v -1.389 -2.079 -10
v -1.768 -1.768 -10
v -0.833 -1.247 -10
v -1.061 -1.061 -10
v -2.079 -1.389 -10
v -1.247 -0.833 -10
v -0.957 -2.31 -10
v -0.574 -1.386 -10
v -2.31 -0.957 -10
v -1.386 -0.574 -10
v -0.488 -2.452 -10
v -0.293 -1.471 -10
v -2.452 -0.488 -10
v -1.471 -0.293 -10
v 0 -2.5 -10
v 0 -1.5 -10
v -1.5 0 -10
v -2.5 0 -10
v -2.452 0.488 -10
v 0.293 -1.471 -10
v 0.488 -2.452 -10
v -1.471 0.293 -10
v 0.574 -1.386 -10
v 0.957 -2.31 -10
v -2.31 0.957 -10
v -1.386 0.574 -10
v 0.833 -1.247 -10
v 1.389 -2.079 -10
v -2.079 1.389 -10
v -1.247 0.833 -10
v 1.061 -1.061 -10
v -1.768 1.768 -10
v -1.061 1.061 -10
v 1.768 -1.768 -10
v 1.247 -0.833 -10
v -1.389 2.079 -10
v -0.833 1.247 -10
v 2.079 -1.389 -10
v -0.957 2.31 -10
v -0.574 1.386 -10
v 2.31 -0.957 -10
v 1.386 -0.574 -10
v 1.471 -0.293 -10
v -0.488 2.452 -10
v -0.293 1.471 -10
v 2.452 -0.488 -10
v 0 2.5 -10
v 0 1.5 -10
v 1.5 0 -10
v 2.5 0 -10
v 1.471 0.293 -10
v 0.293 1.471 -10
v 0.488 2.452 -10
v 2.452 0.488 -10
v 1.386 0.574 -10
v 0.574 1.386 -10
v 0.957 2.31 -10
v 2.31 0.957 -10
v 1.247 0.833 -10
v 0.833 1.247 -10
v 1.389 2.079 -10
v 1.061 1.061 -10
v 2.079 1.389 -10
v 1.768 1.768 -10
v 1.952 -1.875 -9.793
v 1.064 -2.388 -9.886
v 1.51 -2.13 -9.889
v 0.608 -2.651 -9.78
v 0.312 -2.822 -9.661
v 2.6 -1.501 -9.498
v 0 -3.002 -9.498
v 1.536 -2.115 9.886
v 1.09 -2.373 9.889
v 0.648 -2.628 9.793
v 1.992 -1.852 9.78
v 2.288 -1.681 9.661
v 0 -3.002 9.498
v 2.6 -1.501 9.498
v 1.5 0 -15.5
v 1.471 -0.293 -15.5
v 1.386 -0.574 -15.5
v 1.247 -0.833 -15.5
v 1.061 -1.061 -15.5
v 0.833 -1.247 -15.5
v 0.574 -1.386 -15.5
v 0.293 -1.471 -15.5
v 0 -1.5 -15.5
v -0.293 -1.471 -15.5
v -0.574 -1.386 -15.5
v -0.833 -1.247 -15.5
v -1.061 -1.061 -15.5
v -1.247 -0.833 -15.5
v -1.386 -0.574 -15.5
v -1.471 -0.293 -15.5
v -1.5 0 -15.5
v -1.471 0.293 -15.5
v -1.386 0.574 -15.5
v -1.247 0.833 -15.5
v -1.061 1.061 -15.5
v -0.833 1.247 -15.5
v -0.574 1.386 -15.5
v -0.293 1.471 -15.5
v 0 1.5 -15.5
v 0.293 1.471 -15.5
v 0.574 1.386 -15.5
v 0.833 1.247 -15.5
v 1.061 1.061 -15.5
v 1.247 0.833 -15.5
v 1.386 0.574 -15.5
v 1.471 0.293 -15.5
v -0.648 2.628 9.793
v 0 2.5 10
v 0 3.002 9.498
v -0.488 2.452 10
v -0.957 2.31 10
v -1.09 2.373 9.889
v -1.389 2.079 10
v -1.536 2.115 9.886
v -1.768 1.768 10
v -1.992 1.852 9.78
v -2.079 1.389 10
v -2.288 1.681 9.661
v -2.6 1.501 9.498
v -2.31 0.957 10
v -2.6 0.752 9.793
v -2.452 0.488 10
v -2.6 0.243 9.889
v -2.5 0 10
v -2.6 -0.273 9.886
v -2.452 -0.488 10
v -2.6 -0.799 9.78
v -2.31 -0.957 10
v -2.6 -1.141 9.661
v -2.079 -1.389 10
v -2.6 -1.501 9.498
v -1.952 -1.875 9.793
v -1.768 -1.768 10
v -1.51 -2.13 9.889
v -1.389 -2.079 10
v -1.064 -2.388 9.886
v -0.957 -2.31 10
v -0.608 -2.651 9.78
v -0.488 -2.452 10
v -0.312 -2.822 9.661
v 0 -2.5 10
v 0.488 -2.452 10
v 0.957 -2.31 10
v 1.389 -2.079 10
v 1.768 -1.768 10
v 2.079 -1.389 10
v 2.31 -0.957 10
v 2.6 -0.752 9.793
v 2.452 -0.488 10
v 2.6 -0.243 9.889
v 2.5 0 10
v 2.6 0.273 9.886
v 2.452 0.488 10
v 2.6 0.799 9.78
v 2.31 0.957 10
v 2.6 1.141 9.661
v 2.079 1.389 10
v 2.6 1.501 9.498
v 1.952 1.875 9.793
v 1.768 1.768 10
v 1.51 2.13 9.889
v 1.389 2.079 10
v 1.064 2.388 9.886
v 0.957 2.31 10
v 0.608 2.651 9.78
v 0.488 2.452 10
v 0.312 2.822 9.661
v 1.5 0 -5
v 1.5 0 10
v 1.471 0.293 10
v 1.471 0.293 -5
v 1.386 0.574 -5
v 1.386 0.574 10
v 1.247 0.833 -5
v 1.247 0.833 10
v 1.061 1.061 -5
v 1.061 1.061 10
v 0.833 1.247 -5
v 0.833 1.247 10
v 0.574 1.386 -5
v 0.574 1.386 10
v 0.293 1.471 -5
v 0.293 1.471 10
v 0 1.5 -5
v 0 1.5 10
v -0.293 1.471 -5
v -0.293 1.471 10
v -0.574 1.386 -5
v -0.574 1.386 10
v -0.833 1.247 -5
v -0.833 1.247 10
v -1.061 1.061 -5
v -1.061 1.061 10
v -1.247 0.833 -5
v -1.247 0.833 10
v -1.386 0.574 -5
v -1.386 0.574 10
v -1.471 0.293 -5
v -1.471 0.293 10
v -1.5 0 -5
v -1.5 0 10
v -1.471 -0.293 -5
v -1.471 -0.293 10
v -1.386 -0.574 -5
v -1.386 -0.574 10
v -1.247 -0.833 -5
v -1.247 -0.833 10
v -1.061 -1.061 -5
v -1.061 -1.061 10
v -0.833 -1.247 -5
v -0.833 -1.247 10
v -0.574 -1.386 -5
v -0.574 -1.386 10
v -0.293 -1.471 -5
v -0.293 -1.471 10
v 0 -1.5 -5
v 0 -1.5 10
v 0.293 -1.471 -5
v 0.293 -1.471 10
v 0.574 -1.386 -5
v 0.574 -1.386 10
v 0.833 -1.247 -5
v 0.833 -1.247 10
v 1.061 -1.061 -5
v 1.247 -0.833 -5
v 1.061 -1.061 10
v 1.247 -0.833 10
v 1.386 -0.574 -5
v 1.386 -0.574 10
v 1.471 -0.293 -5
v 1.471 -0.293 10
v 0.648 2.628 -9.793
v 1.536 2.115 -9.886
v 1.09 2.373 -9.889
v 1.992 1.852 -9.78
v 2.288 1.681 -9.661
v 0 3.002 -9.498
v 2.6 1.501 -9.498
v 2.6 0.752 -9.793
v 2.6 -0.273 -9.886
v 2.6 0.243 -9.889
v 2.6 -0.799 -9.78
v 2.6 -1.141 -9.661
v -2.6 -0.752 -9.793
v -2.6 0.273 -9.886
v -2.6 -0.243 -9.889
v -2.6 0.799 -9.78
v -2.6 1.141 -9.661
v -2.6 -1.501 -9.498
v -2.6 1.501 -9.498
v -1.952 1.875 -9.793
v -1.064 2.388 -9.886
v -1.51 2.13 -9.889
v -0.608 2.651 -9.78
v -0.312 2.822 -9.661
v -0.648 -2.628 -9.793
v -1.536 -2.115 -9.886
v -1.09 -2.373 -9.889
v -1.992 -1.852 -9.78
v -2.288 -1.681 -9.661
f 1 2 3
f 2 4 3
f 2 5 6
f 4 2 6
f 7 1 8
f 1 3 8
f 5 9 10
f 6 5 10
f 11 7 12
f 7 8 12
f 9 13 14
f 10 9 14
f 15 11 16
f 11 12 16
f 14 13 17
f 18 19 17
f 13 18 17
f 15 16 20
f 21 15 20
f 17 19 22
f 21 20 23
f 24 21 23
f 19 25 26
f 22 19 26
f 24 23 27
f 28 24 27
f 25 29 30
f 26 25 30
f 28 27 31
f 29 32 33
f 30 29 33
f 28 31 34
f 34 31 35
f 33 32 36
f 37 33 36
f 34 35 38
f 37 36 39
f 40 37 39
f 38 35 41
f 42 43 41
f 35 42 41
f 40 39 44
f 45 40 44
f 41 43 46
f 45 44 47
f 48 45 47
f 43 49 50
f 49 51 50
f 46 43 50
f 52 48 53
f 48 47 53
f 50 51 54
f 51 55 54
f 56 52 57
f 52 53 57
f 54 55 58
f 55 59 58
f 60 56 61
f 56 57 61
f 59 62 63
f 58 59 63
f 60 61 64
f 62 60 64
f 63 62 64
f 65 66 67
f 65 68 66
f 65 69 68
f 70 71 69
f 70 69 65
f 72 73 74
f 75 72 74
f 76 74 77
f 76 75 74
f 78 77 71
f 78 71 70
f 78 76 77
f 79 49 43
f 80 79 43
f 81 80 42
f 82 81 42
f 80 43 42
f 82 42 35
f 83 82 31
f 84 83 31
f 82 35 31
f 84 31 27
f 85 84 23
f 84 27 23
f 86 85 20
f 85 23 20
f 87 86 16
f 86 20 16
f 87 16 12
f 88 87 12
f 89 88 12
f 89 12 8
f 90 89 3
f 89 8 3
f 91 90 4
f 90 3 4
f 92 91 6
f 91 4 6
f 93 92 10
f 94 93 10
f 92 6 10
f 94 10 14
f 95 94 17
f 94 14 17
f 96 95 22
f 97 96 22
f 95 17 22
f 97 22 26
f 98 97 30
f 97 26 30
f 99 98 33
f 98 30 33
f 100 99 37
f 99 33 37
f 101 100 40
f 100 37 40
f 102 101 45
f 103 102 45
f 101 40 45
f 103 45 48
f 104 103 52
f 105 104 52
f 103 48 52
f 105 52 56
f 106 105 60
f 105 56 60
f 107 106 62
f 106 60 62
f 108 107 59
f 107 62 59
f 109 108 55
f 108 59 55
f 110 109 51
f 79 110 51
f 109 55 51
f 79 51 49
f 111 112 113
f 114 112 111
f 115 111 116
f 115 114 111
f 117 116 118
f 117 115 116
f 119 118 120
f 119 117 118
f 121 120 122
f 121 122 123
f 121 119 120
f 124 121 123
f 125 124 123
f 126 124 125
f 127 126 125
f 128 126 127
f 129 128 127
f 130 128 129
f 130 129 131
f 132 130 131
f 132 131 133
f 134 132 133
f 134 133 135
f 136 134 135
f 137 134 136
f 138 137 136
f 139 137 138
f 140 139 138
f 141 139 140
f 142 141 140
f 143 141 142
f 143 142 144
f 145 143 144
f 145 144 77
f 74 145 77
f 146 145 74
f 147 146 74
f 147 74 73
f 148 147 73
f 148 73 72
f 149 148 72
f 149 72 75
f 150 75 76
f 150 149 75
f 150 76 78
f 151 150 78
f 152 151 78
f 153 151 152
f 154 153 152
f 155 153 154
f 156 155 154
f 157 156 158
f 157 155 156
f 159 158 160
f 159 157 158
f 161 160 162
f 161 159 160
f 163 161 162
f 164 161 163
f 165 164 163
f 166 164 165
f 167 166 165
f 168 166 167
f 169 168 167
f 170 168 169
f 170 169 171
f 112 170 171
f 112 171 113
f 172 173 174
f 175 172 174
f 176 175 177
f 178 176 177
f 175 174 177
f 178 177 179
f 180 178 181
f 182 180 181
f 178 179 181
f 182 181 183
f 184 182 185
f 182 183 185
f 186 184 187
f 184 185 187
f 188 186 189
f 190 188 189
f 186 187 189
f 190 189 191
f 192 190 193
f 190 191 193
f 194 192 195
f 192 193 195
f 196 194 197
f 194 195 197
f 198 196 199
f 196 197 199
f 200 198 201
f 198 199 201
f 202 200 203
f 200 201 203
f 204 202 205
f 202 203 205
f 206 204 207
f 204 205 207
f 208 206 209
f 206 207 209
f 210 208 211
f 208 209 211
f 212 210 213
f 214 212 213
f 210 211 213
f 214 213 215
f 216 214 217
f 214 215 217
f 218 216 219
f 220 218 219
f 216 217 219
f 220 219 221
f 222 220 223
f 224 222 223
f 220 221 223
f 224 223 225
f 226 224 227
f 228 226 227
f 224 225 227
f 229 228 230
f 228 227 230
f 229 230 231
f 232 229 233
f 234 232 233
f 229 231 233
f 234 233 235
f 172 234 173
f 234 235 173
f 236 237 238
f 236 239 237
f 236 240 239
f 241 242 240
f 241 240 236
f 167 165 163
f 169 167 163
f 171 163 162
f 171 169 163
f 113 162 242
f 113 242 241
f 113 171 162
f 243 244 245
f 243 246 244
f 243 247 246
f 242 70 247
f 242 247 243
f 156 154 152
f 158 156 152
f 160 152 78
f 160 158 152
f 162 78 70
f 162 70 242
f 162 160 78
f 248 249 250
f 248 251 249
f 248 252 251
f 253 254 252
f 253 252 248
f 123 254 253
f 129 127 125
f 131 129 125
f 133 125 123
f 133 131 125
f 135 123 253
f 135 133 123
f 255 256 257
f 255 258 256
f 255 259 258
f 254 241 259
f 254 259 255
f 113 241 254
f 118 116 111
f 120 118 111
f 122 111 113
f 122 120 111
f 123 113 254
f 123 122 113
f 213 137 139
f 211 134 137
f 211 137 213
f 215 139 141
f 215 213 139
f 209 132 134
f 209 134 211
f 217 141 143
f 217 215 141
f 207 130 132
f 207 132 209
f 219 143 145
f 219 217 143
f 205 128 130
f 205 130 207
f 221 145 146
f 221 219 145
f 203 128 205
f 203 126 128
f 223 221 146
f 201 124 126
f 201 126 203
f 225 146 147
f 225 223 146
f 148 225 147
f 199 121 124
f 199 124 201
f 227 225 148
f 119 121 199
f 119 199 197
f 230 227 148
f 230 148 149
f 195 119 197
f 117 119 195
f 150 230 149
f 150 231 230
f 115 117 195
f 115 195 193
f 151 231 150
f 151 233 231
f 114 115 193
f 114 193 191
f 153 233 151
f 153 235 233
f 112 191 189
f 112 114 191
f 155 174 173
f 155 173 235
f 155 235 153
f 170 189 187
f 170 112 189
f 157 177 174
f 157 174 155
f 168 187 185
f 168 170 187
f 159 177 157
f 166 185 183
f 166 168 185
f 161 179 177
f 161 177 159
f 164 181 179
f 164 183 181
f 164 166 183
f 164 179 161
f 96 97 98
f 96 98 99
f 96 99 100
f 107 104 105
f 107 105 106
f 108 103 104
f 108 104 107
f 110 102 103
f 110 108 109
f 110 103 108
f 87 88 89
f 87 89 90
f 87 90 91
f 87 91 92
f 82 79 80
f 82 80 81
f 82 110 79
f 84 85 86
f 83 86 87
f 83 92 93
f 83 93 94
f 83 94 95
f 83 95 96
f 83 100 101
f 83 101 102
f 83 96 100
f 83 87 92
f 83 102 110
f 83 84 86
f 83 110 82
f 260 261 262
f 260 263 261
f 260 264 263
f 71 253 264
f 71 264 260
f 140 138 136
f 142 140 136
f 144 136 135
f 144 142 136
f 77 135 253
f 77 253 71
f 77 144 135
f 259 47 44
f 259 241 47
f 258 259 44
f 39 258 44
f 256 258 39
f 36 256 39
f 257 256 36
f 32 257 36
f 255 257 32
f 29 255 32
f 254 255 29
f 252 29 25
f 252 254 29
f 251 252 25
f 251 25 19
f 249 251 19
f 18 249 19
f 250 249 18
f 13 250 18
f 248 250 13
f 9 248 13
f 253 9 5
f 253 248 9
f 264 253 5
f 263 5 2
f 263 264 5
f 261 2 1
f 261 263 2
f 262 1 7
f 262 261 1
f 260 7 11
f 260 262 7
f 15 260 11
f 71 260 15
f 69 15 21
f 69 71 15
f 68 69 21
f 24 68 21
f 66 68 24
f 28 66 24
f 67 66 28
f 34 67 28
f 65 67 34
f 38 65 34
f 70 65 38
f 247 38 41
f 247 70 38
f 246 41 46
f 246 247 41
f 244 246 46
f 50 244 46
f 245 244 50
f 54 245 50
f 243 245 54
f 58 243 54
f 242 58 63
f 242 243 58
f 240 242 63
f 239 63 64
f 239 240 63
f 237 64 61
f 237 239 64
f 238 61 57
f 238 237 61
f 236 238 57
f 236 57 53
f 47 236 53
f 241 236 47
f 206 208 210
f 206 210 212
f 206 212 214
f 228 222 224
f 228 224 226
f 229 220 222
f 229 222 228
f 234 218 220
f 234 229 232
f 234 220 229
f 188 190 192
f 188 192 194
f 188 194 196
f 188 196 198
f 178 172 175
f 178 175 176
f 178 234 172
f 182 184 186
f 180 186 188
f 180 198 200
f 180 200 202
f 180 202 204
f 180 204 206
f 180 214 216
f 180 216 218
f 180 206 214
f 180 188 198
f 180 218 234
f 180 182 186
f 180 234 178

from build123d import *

# Parameters (mm, degrees)
PAD_DEPTH    = 10
SKETCH001_R  = 1.5
POCKET_DEPTH = 15
SKETCH002_R  = 1.5
PAD001_DEPTH = 5.5


with BuildPart() as part:
    # Sketch → Pad (new body, symmetric)
    with BuildSketch(Plane.XY):
        Polygon((2.6, 1.501111), (0, 3.002221), (-2.6, 1.501111), (-2.6, -1.501111), (0, -3.002221), (2.6, -1.501111), align=None)
    extrude(amount=PAD_DEPTH, both=True)

    # Sketch001 (on Face8 of Pad) → Pocket (cut)
    with BuildSketch(Plane.XY.offset(10)):
        Circle(SKETCH001_R)
    extrude(amount=-POCKET_DEPTH, mode=Mode.SUBTRACT)

    # Sketch002 (on Face4 of Pocket) → Pad001 (join)
    with BuildSketch(Plane(origin=(0, 0, -10), x_dir=(1, 0, 0), z_dir=(0, 0, -1))):
        Circle(SKETCH002_R)
    extrude(amount=PAD001_DEPTH)

    # Sketch004 → Groove (revolve, cut)
    with BuildSketch(Plane.YZ):
        Polygon((2, 10.5), (5, 10.5), (5, -10.5), (2, -10.5), (3.27, -9.23), (3.27, 9.23), align=None)
    revolve(axis=Axis((0, 0, 0), (0, 0, 1)), mode=Mode.SUBTRACT)


solid = part.part
